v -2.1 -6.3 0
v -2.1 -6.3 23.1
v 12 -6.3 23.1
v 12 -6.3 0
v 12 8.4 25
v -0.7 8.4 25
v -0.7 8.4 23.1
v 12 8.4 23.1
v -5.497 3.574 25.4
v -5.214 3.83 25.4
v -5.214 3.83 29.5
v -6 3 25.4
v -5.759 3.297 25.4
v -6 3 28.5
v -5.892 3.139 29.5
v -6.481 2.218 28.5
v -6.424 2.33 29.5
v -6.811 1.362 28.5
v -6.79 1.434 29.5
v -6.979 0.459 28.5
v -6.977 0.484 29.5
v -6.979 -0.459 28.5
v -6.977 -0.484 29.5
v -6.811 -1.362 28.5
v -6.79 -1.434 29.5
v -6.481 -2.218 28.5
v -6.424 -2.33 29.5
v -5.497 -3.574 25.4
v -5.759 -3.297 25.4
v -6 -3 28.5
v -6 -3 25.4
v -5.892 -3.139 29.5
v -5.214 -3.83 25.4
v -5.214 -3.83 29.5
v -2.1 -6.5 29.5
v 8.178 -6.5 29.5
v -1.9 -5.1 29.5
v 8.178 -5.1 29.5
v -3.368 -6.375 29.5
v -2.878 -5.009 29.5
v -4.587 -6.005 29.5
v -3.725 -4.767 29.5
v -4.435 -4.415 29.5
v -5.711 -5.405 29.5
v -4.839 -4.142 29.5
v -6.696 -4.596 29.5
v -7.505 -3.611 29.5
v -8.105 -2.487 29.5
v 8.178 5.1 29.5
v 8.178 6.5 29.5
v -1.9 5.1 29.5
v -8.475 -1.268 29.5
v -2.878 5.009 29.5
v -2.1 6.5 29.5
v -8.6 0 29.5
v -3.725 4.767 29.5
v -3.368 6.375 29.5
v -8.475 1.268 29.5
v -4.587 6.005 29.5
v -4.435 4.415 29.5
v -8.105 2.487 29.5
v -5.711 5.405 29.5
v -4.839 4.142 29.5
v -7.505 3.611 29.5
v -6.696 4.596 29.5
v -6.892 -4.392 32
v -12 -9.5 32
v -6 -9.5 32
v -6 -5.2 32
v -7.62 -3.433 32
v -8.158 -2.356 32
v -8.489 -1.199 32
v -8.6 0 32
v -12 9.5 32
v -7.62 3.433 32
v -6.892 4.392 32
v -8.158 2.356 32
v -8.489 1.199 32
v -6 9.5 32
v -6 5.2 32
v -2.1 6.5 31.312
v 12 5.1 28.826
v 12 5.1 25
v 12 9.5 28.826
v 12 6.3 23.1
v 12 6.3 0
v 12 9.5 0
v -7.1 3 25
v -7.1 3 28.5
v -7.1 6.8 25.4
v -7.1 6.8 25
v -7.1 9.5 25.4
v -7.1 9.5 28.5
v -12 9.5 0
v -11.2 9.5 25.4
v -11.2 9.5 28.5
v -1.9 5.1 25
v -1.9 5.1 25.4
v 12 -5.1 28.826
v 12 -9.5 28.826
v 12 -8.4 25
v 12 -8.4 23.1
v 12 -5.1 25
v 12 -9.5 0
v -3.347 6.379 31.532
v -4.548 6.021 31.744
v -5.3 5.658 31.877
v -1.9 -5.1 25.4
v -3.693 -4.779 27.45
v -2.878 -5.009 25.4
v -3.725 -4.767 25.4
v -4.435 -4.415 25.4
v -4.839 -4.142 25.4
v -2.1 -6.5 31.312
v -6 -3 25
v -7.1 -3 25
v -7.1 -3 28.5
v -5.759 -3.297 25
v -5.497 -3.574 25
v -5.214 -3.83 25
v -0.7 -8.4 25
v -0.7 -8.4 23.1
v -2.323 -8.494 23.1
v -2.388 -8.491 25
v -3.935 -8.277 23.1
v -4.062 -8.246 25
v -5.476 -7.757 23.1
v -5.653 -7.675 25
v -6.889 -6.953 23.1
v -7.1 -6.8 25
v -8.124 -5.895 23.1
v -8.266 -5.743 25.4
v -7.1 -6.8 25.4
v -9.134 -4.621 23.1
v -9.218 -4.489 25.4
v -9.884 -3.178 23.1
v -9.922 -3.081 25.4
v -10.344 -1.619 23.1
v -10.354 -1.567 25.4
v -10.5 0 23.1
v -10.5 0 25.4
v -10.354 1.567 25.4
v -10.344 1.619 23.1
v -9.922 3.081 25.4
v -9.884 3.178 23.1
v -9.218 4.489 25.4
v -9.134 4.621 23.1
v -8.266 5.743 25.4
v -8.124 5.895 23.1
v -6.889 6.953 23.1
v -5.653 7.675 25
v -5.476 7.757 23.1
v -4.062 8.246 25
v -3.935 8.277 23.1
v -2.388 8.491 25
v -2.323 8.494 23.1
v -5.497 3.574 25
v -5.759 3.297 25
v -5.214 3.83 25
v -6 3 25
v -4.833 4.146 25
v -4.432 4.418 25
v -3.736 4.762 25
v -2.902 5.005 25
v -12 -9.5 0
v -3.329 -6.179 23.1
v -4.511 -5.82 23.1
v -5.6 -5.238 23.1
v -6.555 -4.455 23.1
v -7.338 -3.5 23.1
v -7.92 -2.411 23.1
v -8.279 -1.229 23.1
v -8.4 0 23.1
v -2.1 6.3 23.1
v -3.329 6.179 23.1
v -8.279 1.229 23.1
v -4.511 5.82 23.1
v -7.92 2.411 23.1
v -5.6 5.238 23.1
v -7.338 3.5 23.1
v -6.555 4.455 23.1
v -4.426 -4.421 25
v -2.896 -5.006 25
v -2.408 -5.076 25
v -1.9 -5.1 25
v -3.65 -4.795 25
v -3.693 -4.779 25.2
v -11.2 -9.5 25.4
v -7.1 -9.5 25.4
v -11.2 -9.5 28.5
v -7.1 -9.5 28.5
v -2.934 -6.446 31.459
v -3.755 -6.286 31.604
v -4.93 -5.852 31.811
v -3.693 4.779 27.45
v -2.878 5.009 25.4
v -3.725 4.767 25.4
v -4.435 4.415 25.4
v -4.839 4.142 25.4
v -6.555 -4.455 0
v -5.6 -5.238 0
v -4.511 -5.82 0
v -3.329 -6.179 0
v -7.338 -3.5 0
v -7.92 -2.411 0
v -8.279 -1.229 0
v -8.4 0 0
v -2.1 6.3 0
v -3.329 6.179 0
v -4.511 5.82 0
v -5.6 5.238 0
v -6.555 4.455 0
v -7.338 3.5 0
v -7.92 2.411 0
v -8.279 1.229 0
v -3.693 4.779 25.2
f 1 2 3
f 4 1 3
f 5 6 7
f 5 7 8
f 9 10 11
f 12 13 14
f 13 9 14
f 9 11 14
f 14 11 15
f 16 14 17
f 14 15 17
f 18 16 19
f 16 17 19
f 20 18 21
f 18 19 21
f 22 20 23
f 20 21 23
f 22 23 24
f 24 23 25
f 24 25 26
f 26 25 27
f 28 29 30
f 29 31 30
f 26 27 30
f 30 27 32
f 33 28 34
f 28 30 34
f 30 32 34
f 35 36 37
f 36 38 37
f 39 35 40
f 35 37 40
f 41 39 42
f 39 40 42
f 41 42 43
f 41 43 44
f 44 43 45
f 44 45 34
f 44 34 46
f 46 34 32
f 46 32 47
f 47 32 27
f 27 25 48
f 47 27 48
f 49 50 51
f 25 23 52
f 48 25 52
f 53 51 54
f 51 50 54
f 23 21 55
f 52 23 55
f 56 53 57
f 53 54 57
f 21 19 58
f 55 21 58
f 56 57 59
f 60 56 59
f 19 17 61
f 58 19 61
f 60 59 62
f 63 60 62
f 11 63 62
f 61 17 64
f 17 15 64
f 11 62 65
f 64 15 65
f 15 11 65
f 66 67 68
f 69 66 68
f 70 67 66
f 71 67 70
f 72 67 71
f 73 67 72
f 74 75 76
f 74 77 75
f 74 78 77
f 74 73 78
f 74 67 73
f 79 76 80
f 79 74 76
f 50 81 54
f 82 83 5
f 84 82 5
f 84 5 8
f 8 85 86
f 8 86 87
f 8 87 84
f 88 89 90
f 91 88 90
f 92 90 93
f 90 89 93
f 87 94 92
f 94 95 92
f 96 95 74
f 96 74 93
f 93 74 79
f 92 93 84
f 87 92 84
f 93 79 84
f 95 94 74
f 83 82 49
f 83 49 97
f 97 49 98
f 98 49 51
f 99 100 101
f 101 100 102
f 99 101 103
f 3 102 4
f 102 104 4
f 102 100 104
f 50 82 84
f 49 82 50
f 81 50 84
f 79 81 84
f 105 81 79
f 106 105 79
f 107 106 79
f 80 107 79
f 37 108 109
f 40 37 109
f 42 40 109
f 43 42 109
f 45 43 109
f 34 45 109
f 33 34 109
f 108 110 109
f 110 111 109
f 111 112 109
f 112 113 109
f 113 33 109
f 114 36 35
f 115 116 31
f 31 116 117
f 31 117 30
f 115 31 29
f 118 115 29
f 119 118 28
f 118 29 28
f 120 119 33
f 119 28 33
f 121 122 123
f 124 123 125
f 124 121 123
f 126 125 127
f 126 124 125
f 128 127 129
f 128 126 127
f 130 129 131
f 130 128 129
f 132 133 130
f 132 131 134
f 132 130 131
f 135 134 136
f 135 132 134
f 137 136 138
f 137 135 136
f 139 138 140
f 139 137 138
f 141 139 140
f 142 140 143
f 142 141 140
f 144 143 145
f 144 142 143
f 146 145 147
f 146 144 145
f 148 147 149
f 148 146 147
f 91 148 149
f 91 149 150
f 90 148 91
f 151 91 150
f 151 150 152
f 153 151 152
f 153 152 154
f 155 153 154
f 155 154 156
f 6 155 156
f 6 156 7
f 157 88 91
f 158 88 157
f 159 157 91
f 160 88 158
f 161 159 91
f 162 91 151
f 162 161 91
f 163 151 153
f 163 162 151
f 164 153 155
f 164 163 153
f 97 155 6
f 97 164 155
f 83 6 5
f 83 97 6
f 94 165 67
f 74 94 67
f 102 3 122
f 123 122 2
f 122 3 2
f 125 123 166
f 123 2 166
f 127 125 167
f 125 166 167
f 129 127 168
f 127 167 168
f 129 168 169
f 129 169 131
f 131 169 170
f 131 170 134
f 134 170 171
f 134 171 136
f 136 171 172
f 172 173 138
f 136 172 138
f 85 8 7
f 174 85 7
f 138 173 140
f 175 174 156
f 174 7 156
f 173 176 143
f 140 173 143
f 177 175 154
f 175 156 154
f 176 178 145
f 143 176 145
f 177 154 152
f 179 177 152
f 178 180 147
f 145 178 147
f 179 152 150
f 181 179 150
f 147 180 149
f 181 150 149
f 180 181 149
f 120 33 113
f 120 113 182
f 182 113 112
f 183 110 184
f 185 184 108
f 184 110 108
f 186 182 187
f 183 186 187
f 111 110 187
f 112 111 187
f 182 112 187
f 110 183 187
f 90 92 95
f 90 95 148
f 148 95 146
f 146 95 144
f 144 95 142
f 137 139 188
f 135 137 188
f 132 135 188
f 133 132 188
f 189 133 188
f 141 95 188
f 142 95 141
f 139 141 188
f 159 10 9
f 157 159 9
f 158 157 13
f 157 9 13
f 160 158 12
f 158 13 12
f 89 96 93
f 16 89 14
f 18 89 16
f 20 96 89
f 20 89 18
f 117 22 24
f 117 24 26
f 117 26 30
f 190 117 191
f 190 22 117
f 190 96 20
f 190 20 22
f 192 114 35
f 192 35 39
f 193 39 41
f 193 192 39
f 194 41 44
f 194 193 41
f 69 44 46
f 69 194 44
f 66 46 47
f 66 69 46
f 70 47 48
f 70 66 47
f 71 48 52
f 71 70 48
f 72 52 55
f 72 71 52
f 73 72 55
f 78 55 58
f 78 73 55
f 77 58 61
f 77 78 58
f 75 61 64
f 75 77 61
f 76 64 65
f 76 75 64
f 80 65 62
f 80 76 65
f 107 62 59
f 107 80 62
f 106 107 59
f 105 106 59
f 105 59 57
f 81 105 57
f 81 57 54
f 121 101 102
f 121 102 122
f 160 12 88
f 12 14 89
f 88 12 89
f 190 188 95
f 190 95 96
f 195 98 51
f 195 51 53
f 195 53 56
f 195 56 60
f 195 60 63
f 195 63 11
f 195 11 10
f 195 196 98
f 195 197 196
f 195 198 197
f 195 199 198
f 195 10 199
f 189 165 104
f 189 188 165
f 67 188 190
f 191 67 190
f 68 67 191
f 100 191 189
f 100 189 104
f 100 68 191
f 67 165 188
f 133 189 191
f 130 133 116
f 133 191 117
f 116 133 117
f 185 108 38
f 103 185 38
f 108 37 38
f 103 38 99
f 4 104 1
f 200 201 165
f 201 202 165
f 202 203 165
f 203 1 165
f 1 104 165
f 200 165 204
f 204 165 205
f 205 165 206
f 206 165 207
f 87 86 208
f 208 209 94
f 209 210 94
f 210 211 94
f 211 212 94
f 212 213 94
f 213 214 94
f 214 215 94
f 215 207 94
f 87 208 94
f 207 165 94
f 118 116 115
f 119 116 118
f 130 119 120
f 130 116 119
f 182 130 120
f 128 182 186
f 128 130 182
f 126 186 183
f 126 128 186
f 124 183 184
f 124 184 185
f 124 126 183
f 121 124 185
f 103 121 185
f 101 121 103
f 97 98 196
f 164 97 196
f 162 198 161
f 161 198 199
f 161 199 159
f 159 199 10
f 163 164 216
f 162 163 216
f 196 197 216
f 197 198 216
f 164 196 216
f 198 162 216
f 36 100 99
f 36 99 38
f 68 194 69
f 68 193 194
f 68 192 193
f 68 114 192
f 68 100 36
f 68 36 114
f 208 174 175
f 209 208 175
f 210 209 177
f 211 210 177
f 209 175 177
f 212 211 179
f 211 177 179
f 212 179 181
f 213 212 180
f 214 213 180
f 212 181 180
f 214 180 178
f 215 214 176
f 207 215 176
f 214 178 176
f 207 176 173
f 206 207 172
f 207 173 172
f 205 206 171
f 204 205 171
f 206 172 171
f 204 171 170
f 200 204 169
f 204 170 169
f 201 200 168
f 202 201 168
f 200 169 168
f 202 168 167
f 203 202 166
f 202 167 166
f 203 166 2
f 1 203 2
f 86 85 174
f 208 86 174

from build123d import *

# Parameters (mm, degrees)
SKETCH_1_24X19_W         = 19
SKETCH_1_24X19_H         = 24
EXTRUDE_1_33_DEPTH       = 33
CUT_EXTRUDE_2_REACH      = 38.377
CUT_EXTRUDE_4_2_DEPTH    = 1.9
CUT_EXTRUDE_6_3_REACH    = 29.71
SKETCH_7_5_W             = 24
SKETCH_7_5_H             = 19
EXTRUDE_7_DEPTH          = 5
CUT_EXTRUDE_10_4_REACH   = 41.925
SKETCH_11_W              = 8.5
SKETCH_11_H              = 3.1
CUT_EXTRUDE_11_5_DEPTH   = 4.9
SKETCH_11D1_W            = 6
SKETCH_11D1_H            = 3.1
CUT_EXTRUDE_11D1_6_DEPTH = 10
CUT_EXTRUDE_12_9_REACH   = 31.655
CUT_EXTRUDE_11_DEPTH     = 3.5
SKETCH_5902_W            = 53.98
SKETCH_5902_H            = 19
CUT_EXTRUDE_12_DEPTH     = 1
CUT_EXTRUDE_13_DEPTH     = 40.102429623
CUT_EXTRUDE_15_REACH     = 33.036
SKETCH_5020_R            = 3.5
EXTRUDE_2_DEPTH          = 0.4
SKETCH_7444_W            = 0.8
SKETCH_7444_H            = 3.1
EXTRUDE_3_DEPTH          = 19
CUT_EXTRUDE_16_DEPTH     = 32.036269144


with BuildPart() as part:
    # 1底部方形_24x19 → 1凸台-拉伸_高33 (new body)
    with BuildSketch(Plane(origin=(0, 0, 0), x_dir=(0, 1, 0), z_dir=(0, 0, 1))):
        Rectangle(SKETCH_1_24X19_W, SKETCH_1_24X19_H)
    extrude(amount=EXTRUDE_1_33_DEPTH)

    # 2吸嘴停靠渐变槽 → 2切除-拉伸 (cut, up to next)
    with BuildSketch(Plane.XY.offset(33), mode=Mode.PRIVATE) as cut_extrude_2_sk1:
        with BuildLine():
            Line((12, -5.1), (12, 5.1))
            Line((12, 5.1), (-1.9, 5.1))
            add(Edge.make_bspline(
                [(-5.213938048, 3.830222216), (-3.829124073, 5.093205317), (-1.9, 5.1)],
                knots=[0, 0, 0, 1, 1, 1], degree=2))
            ThreePointArc((-5.213938048, 3.830222216), (-7, 0), (-5.213938048, -3.830222216))
            add(Edge.make_bspline(
                [(-5.213938048, -3.830222216), (-3.829124073, -5.093205317), (-1.9, -5.1)],
                knots=[0, 0, 0, 1, 1, 1], degree=2))
            Line((-1.9, -5.1), (12, -5.1))
        make_face()
    cut_extrude_2_tool1 = extrude(cut_extrude_2_sk1.sketch, amount=-CUT_EXTRUDE_2_REACH, mode=Mode.PRIVATE) & part.part
    add(cut_extrude_2_tool1.solids().sort_by_distance((3.017719, 0, 33))[0], mode=Mode.SUBTRACT)

    # 4反光板停靠槽 → 4切除-拉伸2 (cut)
    with BuildSketch(Plane.XY.offset(25)):
        with BuildLine():
            Line((-0.7, 8.4), (12, 8.4))
            Line((12, 8.4), (12, -8.4))
            Line((12, -8.4), (-0.7, -8.4))
            ThreePointArc((-0.7, -8.4), (-10.5, 0), (-0.7, 8.4))
        make_face()
    extrude(amount=-CUT_EXTRUDE_4_2_DEPTH, mode=Mode.SUBTRACT)

    # 6反光板小圆柱 → 6切除-拉伸3 (cut, up to next)
    with BuildSketch(Plane.XY.offset(23.1), mode=Mode.PRIVATE) as cut_extrude_6_3_sk1:
        with BuildLine():
            Line((-2.1, -6.3), (12, -6.3))
            Line((12, -6.3), (12, 6.3))
            Line((12, 6.3), (-2.1, 6.3))
            ThreePointArc((-2.1, 6.3), (-8.4, 0), (-2.1, -6.3))
        make_face()
    cut_extrude_6_3_tool1 = extrude(cut_extrude_6_3_sk1.sketch, amount=-CUT_EXTRUDE_6_3_REACH, mode=Mode.PRIVATE) & part.part
    add(cut_extrude_6_3_tool1.solids().sort_by_distance((2.424095, 0, 23.1))[0], mode=Mode.SUBTRACT)

    # 7草图5 → 7凸台-拉伸_底板厚度 (add)
    with BuildSketch(Plane(origin=(0, 0, 0), x_dir=(1, 0, 0), z_dir=(0, 0, -1))):
        Rectangle(SKETCH_7_5_W, SKETCH_7_5_H)
    extrude(amount=-EXTRUDE_7_DEPTH)

    # 10切除-拉伸4: up to this face of the body (flat: up to its plane)
    cut_extrude_10_4_end = Plane(part.part.faces().sort_by_distance((0, -9.5, 16.5))[0])
    # Sketch 10 → 10切除-拉伸4 (cut, up to the picked face)
    with BuildSketch(Plane(origin=(0, 9.5, 0), x_dir=(-1, 0, 0), z_dir=(0, 1, 0)), mode=Mode.PRIVATE) as cut_extrude_10_4_sk1:
        Polygon((-12, 31.162738066), (-12, 33), (9, 33), align=None)
    cut_extrude_10_4_tool1 = split(extrude(cut_extrude_10_4_sk1.sketch, amount=-CUT_EXTRUDE_10_4_REACH, mode=Mode.PRIVATE), bisect_by=cut_extrude_10_4_end, keep=Keep.BOTH, mode=Mode.PRIVATE)
    add(cut_extrude_10_4_tool1.solids().sort_by(Axis((5, 9.5, 32.387579), (0, -1, 0)))[0], mode=Mode.SUBTRACT)

    # Sketch 11 → 11切除-拉伸5 (cut)
    with BuildSketch(Plane(origin=(-12, 0, 0), x_dir=(0, -1, 0), z_dir=(-1, 0, 0))):
        with Locations((-5.25, 26.95)):
            Rectangle(SKETCH_11_W, SKETCH_11_H)
        with Locations((5.25, 26.95)):
            Rectangle(SKETCH_11_W, SKETCH_11_H)
    extrude(amount=-CUT_EXTRUDE_11_5_DEPTH, mode=Mode.SUBTRACT)

    # 11d1_磁铁开窗 → 11d1切除-拉伸6 (cut)
    with BuildSketch(Plane(origin=(-12, 0, 0), x_dir=(0, -1, 0), z_dir=(-1, 0, 0))):
        with Locations((0, 26.95)):
            Rectangle(SKETCH_11D1_W, SKETCH_11D1_H)
    extrude(amount=-CUT_EXTRUDE_11D1_6_DEPTH, mode=Mode.SUBTRACT)

    # 12切除薄壁 → 12切除-拉伸9 (cut, up to next)
    with BuildSketch(Plane.XY.offset(25.4), mode=Mode.PRIVATE) as cut_extrude_12_9_sk1:
        with BuildLine():
            Line((-0.7, 8.4), (-0.7, -8.4))
            ThreePointArc((-0.7, -8.4), (-10.5, 0), (-0.7, 8.4))
        make_face()
    cut_extrude_12_9_tool1 = extrude(cut_extrude_12_9_sk1.sketch, amount=-CUT_EXTRUDE_12_9_REACH, mode=Mode.PRIVATE) & part.part
    add(cut_extrude_12_9_tool1.solids().sort_by_distance((-4.916056, 0, 25.4))[0], mode=Mode.SUBTRACT)

    # Sketch 5392 → 切除-拉伸11 (cut)
    with BuildSketch(Plane.XY.offset(33)):
        with BuildLine():
            Line((-2.099999748, 6.5), (12, 6.5))
            Line((12, 6.5), (12, -6.5))
            Line((12, -6.5), (-2.099999748, -6.5))
            ThreePointArc((-2.099999748, -6.5), (-8.6, 0), (-2.099999748, 6.5))
        make_face()
    extrude(amount=-CUT_EXTRUDE_11_DEPTH, mode=Mode.SUBTRACT)

    # Sketch 5902 → 切除-拉伸12 (cut)
    with BuildSketch(Plane.XY.offset(33)):
        with Locations((14.99, 0)):
            Rectangle(SKETCH_5902_W, SKETCH_5902_H)
    extrude(amount=-CUT_EXTRUDE_12_DEPTH, mode=Mode.SUBTRACT)

    # Sketch 6207 → 切除-拉伸13 (cut, through all)
    with BuildSketch(Plane.XZ.offset(9.5)):
        Polygon((2.430052303, 32), (12, 31.162738066), (12, 28.826114347), (-6, 32), align=None)
    extrude(amount=-CUT_EXTRUDE_13_DEPTH, mode=Mode.SUBTRACT)

    # Sketch 5020 → 切除-拉伸15 (cut, up to next)
    with BuildSketch(Plane.XY.offset(5), mode=Mode.PRIVATE) as cut_extrude_15_sk1:
        with Locations((2, 0)):
            Circle(SKETCH_5020_R)
    cut_extrude_15_tool1 = extrude(cut_extrude_15_sk1.sketch, amount=-CUT_EXTRUDE_15_REACH, mode=Mode.PRIVATE) & part.part
    add(cut_extrude_15_tool1.solids().sort_by_distance((2, 0, 5))[0], mode=Mode.SUBTRACT)

    # Sketch 6982 → 凸台-拉伸2 (add)
    with BuildSketch(Plane(origin=(0, 0, 25.4), x_dir=(1, 0, 0), z_dir=(0, 0, -1))):
        with BuildLine():
            Line((-7.1, -3), (-7.1, -6.8))
            ThreePointArc((-7.1, -6.8), (-4.061552813, -8.246211251), (-0.7, -8.4))
            Line((-0.7, -8.4), (-0.7, -5.1))
            Line((-0.7, -5.1), (-1.9, -5.1))
            add(Edge.make_bspline(
                [(-1.9, -5.1), (-3.829124073, -5.093205317), (-5.213938048, -3.830222216)],
                knots=[0, 0, 0, 1, 1, 1], degree=2))
            ThreePointArc((-5.213938048, -3.830222216), (-5.630777158, -3.437652866), (-6, -3))
            Line((-6, -3), (-7.1, -3))
        make_face()
        with BuildLine():
            Line((-7.1, 3), (-6, 3))
            ThreePointArc((-6, 3), (-5.630777158, 3.437652866), (-5.213938048, 3.830222216))
            add(Edge.make_bspline(
                [(-5.213938048, 3.830222216), (-3.829124073, 5.093205317), (-1.9, 5.1)],
                knots=[0, 0, 0, 1, 1, 1], degree=2))
            Line((-1.9, 5.1), (-0.7, 5.1))
            Line((-0.7, 5.1), (-0.7, 8.4))
            ThreePointArc((-0.7, 8.4), (-4.061552813, 8.246211251), (-7.1, 6.8))
            Line((-7.1, 6.8), (-7.1, 3))
        make_face()
    extrude(amount=EXTRUDE_2_DEPTH)

    # Sketch 7444 → 凸台-拉伸3 (add)
    with BuildSketch(Plane.XZ.offset(9.5)):
        with Locations((-11.6, 26.95)):
            Rectangle(SKETCH_7444_W, SKETCH_7444_H)
    extrude(amount=-EXTRUDE_3_DEPTH)

    # 草图13 → 切除-拉伸16 (cut, through all)
    with BuildSketch(Plane.XY.offset(5)):
        with BuildLine():
            Line((-2.1, -6.3), (12, -6.3))
            Line((12, -6.3), (12, 6.3))
            Line((12, 6.3), (-2.1, 6.3))
            ThreePointArc((-2.1, 6.3), (-8.4, 0), (-2.1, -6.3))
        make_face()
    extrude(amount=-CUT_EXTRUDE_16_DEPTH, mode=Mode.SUBTRACT)


solid = part.part
